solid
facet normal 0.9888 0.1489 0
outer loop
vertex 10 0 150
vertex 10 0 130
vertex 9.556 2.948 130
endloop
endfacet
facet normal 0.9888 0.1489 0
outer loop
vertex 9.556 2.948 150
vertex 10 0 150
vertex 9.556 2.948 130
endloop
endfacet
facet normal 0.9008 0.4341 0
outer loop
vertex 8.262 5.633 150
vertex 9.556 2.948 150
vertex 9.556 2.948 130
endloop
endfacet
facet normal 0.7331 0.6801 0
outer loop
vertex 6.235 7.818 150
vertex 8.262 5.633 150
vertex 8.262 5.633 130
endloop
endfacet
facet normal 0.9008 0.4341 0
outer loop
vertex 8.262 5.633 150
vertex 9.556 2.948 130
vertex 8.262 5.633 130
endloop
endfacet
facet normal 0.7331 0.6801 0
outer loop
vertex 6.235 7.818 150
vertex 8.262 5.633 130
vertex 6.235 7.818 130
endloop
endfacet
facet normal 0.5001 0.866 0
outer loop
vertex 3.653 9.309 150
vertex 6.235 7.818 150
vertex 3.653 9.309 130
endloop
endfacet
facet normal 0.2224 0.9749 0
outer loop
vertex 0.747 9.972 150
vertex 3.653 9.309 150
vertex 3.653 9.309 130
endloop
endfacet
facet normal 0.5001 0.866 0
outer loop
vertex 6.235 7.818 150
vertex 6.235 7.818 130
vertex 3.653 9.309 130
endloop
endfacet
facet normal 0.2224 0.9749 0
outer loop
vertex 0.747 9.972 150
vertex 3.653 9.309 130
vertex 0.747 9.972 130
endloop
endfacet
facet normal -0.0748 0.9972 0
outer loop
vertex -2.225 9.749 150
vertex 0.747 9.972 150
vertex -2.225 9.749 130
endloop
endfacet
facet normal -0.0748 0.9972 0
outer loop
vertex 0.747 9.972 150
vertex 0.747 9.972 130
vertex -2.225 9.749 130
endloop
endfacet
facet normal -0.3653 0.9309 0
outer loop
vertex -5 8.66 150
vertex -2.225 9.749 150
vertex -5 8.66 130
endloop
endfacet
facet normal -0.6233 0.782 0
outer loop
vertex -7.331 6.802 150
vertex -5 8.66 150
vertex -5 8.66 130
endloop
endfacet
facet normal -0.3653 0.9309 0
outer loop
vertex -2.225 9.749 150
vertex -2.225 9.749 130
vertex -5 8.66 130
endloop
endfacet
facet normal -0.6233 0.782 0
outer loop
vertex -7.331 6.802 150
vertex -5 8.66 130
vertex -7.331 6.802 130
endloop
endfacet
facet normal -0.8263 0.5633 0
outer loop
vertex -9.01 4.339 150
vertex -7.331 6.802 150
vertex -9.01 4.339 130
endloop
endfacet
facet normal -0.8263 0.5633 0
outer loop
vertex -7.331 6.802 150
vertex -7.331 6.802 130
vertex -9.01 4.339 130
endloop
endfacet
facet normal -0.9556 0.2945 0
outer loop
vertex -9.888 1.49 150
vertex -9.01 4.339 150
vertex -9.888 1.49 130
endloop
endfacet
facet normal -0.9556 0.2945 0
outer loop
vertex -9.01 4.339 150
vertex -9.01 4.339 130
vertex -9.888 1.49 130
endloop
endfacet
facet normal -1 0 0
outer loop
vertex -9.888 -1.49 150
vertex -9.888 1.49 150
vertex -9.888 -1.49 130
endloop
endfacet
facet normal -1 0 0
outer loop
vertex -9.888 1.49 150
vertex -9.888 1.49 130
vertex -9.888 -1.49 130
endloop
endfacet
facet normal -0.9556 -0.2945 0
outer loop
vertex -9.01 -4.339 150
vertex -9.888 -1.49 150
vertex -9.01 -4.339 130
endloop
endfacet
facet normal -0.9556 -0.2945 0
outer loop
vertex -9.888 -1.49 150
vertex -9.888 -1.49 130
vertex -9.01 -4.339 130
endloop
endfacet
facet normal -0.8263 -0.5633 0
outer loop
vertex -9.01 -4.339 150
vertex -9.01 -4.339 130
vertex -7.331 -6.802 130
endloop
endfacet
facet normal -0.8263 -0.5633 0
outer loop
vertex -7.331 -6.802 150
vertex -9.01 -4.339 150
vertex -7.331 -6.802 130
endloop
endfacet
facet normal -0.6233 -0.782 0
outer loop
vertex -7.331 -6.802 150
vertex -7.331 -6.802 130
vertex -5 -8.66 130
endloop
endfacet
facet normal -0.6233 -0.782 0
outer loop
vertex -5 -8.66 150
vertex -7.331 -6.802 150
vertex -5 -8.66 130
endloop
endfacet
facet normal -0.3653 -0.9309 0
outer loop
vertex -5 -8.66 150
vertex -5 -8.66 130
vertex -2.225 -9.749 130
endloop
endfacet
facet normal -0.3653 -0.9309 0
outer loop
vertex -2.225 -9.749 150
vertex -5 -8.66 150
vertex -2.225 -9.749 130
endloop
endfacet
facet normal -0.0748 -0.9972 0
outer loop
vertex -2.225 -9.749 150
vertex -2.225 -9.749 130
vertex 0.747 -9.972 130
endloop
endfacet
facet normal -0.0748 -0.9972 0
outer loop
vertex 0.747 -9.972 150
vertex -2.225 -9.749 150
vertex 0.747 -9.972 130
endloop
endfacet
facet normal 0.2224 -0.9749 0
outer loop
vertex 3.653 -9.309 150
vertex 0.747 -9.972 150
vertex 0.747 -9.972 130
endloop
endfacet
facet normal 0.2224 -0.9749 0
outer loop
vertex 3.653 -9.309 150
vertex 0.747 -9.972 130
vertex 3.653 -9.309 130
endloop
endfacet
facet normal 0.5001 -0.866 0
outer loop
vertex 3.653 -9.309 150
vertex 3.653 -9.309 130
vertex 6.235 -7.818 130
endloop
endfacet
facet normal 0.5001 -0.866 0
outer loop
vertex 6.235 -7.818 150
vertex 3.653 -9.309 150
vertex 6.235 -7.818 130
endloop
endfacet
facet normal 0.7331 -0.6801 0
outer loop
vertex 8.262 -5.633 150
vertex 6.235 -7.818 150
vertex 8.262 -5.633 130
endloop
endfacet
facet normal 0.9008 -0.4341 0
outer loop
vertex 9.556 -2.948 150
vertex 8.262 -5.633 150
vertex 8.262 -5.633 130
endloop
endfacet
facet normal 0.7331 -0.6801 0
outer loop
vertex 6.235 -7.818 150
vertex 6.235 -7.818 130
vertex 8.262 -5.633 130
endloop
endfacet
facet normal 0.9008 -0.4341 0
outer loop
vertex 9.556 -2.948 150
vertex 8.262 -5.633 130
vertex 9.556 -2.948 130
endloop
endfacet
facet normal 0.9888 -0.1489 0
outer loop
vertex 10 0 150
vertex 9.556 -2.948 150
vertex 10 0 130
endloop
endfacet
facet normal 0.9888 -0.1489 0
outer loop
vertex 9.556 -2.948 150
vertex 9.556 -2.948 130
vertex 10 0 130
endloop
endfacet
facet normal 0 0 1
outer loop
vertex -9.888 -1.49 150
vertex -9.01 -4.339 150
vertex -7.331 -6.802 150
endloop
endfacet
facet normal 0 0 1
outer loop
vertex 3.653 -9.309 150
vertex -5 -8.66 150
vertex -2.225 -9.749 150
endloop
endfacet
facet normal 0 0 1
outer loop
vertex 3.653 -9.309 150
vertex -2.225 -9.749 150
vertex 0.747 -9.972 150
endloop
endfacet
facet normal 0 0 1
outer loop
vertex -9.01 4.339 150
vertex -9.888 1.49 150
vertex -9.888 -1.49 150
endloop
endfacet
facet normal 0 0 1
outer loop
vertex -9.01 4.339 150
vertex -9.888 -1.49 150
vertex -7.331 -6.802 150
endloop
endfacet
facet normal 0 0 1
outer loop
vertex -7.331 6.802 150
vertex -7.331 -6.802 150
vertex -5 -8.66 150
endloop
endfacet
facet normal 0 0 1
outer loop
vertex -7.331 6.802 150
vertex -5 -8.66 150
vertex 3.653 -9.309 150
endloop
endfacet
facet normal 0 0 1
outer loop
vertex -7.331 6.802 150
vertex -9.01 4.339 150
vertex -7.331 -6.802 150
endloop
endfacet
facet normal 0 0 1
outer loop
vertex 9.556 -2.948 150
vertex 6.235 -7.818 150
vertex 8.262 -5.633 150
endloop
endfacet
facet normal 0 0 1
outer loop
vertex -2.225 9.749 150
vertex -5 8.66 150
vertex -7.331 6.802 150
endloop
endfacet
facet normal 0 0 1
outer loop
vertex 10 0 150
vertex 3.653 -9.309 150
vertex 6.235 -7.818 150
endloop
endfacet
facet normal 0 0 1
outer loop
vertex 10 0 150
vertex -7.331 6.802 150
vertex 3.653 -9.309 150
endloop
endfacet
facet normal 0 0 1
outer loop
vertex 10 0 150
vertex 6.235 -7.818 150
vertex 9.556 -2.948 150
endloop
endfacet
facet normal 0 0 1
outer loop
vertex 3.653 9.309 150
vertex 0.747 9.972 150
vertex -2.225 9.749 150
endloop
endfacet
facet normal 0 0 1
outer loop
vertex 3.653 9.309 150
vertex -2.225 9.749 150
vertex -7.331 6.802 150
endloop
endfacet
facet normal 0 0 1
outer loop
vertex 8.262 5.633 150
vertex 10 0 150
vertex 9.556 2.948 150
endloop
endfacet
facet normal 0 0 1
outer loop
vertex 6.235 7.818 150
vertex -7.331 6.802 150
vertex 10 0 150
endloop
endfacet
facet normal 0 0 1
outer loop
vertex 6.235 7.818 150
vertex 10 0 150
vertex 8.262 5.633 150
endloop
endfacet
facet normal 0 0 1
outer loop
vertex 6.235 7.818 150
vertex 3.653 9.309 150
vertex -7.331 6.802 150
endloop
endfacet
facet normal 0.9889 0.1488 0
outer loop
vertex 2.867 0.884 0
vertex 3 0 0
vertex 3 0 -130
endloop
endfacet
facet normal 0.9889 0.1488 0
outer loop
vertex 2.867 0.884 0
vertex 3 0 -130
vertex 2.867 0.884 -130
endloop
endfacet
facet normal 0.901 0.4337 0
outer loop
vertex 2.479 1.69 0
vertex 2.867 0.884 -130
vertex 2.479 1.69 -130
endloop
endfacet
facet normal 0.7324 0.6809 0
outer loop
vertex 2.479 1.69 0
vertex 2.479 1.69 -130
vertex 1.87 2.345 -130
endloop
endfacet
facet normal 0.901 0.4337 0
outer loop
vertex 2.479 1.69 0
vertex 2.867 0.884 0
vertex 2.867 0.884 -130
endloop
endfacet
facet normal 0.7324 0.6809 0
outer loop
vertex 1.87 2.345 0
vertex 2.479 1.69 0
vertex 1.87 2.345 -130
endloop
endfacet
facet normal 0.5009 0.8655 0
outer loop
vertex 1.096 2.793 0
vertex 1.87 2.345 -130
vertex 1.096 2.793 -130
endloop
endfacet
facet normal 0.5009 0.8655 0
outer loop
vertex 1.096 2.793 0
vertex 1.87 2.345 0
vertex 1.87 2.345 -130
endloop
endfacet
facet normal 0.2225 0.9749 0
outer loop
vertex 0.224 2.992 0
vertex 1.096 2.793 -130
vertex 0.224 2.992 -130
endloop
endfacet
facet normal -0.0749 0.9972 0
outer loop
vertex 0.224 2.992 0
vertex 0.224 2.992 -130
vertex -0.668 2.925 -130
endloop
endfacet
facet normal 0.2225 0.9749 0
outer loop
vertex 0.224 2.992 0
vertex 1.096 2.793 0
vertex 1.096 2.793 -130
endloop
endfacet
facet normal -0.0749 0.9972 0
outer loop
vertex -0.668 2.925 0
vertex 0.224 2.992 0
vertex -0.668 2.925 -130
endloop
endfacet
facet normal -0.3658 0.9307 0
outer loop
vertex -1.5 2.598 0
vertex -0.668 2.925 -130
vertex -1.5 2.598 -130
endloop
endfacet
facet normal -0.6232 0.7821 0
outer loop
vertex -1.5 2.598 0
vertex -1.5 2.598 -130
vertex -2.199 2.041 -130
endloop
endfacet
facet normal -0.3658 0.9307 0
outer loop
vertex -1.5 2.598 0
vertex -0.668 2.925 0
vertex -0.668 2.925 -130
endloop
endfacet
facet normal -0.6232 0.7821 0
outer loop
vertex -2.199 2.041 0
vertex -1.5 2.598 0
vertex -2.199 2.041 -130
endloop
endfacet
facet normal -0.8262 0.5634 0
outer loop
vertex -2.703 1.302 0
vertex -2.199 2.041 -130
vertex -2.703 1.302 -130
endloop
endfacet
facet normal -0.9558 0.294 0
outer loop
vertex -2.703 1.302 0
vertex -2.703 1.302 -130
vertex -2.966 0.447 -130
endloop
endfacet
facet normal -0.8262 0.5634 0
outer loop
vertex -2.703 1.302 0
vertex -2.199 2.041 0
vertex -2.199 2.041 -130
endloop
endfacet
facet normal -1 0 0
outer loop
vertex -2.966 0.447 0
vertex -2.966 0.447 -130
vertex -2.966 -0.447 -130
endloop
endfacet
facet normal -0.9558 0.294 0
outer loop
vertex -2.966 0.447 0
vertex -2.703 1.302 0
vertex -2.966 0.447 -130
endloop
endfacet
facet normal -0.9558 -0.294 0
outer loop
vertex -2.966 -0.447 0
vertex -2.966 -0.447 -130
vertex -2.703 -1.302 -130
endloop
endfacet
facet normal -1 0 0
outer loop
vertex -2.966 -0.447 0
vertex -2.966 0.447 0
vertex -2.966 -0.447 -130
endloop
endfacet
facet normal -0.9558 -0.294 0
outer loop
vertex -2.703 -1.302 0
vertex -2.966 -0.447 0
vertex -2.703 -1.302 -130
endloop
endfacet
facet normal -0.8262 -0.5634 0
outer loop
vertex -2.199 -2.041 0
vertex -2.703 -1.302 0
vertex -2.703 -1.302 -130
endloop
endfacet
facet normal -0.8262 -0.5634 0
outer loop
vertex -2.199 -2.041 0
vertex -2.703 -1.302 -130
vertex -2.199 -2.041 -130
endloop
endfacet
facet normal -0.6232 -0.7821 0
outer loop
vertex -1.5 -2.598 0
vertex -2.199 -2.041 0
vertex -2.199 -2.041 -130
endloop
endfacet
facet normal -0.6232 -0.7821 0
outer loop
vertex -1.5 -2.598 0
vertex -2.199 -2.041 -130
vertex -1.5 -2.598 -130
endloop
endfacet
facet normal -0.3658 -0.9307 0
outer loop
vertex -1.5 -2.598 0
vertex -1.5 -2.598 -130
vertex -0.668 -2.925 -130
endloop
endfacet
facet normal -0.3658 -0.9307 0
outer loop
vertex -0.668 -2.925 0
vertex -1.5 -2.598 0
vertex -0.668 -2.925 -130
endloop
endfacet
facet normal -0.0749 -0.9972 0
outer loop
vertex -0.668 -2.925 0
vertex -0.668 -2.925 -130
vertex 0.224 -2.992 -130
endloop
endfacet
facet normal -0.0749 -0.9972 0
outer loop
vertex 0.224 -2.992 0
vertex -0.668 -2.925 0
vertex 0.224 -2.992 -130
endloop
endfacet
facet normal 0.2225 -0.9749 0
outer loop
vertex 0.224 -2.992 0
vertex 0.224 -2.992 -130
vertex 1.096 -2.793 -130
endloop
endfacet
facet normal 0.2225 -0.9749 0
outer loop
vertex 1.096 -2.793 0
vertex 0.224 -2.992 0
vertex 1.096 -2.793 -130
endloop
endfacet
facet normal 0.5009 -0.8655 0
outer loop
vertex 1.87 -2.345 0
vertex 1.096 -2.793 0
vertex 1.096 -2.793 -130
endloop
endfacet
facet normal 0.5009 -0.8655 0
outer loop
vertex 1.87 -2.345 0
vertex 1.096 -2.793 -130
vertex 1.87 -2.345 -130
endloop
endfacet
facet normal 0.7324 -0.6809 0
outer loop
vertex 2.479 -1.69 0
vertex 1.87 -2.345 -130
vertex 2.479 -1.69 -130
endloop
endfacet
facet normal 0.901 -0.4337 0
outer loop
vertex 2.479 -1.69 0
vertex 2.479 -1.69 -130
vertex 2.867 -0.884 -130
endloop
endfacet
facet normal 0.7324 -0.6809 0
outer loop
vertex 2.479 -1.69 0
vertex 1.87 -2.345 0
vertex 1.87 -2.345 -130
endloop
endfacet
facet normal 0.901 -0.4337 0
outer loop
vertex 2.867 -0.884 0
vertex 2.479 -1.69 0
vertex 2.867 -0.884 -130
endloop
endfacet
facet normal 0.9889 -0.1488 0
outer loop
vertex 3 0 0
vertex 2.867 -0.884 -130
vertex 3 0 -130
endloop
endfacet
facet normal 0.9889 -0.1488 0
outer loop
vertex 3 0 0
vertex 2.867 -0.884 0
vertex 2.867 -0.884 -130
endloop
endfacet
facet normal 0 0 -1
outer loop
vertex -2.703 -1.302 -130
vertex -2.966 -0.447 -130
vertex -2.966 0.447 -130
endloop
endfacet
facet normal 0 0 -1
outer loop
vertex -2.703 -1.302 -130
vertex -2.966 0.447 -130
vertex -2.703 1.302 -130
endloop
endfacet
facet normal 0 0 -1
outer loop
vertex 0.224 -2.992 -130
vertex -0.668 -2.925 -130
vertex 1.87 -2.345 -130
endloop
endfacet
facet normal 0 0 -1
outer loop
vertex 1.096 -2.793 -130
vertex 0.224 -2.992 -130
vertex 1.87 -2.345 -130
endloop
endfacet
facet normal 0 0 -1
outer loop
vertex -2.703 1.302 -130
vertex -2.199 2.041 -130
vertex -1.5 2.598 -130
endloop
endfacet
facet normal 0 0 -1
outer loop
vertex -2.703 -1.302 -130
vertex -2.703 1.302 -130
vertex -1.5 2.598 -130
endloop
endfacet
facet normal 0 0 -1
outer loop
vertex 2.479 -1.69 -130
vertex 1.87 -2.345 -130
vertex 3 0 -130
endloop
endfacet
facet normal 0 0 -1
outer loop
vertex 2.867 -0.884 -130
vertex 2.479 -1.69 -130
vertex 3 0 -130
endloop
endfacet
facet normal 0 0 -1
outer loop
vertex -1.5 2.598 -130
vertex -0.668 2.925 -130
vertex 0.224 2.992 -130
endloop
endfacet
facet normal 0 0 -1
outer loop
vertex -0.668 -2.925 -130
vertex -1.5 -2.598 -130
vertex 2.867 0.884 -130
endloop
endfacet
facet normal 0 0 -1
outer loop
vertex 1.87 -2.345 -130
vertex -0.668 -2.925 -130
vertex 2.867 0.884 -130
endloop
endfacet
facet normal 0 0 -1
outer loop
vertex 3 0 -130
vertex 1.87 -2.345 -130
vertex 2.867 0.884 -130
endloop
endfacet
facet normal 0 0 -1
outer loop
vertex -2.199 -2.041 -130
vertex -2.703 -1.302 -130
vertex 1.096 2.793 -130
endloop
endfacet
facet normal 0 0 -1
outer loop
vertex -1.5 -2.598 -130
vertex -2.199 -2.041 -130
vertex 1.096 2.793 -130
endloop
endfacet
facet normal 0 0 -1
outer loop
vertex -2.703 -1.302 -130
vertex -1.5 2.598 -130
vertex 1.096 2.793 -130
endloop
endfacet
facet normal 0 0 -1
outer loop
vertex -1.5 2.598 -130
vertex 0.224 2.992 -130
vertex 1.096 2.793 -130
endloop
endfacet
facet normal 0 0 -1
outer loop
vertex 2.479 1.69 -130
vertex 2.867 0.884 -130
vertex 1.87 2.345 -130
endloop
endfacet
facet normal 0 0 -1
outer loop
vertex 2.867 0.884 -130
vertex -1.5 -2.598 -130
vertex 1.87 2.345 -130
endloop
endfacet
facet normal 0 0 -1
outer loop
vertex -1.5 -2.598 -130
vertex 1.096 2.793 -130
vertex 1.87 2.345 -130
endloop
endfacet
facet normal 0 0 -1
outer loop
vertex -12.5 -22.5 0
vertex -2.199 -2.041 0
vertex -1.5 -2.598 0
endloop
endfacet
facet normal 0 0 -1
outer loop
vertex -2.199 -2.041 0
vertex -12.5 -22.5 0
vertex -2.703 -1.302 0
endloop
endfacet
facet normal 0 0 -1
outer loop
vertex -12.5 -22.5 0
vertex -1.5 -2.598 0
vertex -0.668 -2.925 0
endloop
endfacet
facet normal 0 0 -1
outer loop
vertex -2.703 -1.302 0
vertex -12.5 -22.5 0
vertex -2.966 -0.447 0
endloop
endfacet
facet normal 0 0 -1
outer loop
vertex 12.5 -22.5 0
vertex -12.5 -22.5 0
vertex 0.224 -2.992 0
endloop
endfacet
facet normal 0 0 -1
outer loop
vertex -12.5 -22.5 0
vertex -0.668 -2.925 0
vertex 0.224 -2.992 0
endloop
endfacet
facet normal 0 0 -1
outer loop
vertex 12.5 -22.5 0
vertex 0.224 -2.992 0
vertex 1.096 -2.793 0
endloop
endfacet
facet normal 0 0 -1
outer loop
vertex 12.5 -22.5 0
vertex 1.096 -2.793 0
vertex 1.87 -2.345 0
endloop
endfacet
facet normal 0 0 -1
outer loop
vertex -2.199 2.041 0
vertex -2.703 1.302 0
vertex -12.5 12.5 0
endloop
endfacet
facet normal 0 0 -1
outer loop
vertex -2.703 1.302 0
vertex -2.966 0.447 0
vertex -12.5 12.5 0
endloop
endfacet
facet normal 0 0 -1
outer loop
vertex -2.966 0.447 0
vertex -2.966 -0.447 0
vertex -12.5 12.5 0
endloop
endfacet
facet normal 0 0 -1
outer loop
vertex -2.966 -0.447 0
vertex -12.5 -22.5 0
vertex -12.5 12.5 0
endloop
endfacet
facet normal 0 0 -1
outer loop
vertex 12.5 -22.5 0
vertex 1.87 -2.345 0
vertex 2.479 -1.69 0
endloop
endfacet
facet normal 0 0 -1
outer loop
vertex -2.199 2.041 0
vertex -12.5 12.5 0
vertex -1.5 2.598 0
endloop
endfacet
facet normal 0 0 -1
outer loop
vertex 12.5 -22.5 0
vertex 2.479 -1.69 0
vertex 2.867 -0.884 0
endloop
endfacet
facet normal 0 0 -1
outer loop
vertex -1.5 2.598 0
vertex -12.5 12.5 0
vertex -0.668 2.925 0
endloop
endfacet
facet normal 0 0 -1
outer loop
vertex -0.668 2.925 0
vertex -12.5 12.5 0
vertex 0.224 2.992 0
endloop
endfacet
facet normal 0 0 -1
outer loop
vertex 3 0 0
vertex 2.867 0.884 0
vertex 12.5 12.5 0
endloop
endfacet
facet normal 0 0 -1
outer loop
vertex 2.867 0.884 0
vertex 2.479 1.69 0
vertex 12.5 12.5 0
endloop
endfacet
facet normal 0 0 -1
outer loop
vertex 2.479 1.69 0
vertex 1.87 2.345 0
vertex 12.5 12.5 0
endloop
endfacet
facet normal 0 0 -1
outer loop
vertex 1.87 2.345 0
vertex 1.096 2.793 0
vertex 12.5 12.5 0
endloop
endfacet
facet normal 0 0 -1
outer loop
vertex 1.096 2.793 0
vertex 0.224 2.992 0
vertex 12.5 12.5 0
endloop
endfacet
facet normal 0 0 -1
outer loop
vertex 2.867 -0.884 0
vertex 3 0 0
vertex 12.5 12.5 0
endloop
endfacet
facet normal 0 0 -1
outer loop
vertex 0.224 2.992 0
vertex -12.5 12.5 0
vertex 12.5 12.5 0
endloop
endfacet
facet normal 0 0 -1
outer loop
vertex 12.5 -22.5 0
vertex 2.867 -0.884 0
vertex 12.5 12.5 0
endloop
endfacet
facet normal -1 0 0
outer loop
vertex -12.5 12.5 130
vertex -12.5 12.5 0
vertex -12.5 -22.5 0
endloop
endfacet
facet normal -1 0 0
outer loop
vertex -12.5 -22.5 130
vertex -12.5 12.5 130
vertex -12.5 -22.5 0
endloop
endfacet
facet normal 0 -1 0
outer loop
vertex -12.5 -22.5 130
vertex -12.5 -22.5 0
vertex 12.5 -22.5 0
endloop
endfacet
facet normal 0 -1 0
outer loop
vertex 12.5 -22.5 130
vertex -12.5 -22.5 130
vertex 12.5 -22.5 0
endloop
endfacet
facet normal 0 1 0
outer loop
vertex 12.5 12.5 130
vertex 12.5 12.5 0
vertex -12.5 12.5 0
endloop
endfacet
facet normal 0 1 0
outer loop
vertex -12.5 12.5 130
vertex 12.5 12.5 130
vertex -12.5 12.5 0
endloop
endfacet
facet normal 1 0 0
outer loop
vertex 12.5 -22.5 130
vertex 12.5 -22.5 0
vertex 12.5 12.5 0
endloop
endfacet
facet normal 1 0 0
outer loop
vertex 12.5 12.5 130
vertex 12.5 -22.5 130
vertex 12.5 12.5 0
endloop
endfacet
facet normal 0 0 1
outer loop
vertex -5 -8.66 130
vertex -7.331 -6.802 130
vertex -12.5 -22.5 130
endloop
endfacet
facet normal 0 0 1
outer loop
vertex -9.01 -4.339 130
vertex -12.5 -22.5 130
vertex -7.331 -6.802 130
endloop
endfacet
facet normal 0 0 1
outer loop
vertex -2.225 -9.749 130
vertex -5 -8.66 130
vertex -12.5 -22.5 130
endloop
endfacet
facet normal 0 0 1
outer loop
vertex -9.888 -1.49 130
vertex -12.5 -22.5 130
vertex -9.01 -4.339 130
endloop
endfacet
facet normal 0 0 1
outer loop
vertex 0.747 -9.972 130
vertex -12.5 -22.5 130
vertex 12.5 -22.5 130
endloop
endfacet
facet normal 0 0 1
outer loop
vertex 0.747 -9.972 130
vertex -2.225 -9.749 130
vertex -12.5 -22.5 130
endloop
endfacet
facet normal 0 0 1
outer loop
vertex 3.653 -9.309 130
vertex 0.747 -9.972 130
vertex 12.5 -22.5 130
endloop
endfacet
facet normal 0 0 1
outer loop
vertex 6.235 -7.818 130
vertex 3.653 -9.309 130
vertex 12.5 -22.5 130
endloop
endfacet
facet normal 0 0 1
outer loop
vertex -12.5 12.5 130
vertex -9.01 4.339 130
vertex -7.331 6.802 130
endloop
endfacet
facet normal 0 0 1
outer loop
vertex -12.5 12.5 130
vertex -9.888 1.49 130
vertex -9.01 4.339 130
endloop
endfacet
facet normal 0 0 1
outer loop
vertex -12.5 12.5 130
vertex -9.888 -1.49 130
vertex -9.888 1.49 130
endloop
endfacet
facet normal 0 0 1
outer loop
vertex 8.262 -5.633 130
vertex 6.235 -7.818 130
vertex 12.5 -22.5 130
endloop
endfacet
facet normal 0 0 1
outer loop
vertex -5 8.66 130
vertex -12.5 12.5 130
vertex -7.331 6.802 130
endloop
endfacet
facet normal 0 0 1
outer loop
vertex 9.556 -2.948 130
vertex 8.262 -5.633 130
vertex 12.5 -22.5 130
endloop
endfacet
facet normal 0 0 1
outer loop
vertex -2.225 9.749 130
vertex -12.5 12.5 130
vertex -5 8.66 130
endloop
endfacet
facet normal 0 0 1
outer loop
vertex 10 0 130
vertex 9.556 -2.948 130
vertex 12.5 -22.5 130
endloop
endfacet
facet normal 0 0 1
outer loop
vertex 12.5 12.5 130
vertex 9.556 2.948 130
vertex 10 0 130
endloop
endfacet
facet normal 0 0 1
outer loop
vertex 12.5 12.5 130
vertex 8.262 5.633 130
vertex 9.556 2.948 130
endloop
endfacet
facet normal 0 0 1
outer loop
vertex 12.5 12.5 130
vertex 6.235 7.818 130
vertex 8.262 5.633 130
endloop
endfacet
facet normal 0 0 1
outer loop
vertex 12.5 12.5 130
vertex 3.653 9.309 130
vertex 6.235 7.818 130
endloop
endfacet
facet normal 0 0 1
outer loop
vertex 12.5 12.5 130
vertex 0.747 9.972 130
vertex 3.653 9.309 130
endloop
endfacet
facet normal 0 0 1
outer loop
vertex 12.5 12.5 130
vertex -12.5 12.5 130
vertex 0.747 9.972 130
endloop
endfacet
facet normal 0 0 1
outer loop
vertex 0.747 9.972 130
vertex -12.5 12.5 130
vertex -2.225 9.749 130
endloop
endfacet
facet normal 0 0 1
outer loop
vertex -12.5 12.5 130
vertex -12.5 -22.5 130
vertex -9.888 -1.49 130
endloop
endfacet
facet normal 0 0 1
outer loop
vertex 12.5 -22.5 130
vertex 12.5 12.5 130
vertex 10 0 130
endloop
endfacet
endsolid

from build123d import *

# Parameters (mm, degrees)
F0_R     = 3
F3_DEPTH = 130
F4_DEPTH = 130
F5_START = 130
F2_R     = 10
F5_DEPTH = 20


with BuildPart() as f3:
    # F0 (on Top) → F3 (new body)
    with BuildSketch(Plane.XY):
        Circle(F0_R)
    extrude(amount=-F3_DEPTH)

    # F1 (on Top) → F4 (join)
    with BuildSketch(Plane.XY):
        Polygon((12.5, -12.5), (12.5, 12.5), (-12.5, 12.5), (-12.5, -12.5), (-12.5, -22.5), (12.5, -22.5), align=None)
    extrude(amount=F4_DEPTH)

    # F2 (on Top) → F5 (join)
    with BuildSketch(Plane.XY.offset(F5_START)):
        Circle(F2_R)
    extrude(amount=F5_DEPTH)


solid = f3.part
